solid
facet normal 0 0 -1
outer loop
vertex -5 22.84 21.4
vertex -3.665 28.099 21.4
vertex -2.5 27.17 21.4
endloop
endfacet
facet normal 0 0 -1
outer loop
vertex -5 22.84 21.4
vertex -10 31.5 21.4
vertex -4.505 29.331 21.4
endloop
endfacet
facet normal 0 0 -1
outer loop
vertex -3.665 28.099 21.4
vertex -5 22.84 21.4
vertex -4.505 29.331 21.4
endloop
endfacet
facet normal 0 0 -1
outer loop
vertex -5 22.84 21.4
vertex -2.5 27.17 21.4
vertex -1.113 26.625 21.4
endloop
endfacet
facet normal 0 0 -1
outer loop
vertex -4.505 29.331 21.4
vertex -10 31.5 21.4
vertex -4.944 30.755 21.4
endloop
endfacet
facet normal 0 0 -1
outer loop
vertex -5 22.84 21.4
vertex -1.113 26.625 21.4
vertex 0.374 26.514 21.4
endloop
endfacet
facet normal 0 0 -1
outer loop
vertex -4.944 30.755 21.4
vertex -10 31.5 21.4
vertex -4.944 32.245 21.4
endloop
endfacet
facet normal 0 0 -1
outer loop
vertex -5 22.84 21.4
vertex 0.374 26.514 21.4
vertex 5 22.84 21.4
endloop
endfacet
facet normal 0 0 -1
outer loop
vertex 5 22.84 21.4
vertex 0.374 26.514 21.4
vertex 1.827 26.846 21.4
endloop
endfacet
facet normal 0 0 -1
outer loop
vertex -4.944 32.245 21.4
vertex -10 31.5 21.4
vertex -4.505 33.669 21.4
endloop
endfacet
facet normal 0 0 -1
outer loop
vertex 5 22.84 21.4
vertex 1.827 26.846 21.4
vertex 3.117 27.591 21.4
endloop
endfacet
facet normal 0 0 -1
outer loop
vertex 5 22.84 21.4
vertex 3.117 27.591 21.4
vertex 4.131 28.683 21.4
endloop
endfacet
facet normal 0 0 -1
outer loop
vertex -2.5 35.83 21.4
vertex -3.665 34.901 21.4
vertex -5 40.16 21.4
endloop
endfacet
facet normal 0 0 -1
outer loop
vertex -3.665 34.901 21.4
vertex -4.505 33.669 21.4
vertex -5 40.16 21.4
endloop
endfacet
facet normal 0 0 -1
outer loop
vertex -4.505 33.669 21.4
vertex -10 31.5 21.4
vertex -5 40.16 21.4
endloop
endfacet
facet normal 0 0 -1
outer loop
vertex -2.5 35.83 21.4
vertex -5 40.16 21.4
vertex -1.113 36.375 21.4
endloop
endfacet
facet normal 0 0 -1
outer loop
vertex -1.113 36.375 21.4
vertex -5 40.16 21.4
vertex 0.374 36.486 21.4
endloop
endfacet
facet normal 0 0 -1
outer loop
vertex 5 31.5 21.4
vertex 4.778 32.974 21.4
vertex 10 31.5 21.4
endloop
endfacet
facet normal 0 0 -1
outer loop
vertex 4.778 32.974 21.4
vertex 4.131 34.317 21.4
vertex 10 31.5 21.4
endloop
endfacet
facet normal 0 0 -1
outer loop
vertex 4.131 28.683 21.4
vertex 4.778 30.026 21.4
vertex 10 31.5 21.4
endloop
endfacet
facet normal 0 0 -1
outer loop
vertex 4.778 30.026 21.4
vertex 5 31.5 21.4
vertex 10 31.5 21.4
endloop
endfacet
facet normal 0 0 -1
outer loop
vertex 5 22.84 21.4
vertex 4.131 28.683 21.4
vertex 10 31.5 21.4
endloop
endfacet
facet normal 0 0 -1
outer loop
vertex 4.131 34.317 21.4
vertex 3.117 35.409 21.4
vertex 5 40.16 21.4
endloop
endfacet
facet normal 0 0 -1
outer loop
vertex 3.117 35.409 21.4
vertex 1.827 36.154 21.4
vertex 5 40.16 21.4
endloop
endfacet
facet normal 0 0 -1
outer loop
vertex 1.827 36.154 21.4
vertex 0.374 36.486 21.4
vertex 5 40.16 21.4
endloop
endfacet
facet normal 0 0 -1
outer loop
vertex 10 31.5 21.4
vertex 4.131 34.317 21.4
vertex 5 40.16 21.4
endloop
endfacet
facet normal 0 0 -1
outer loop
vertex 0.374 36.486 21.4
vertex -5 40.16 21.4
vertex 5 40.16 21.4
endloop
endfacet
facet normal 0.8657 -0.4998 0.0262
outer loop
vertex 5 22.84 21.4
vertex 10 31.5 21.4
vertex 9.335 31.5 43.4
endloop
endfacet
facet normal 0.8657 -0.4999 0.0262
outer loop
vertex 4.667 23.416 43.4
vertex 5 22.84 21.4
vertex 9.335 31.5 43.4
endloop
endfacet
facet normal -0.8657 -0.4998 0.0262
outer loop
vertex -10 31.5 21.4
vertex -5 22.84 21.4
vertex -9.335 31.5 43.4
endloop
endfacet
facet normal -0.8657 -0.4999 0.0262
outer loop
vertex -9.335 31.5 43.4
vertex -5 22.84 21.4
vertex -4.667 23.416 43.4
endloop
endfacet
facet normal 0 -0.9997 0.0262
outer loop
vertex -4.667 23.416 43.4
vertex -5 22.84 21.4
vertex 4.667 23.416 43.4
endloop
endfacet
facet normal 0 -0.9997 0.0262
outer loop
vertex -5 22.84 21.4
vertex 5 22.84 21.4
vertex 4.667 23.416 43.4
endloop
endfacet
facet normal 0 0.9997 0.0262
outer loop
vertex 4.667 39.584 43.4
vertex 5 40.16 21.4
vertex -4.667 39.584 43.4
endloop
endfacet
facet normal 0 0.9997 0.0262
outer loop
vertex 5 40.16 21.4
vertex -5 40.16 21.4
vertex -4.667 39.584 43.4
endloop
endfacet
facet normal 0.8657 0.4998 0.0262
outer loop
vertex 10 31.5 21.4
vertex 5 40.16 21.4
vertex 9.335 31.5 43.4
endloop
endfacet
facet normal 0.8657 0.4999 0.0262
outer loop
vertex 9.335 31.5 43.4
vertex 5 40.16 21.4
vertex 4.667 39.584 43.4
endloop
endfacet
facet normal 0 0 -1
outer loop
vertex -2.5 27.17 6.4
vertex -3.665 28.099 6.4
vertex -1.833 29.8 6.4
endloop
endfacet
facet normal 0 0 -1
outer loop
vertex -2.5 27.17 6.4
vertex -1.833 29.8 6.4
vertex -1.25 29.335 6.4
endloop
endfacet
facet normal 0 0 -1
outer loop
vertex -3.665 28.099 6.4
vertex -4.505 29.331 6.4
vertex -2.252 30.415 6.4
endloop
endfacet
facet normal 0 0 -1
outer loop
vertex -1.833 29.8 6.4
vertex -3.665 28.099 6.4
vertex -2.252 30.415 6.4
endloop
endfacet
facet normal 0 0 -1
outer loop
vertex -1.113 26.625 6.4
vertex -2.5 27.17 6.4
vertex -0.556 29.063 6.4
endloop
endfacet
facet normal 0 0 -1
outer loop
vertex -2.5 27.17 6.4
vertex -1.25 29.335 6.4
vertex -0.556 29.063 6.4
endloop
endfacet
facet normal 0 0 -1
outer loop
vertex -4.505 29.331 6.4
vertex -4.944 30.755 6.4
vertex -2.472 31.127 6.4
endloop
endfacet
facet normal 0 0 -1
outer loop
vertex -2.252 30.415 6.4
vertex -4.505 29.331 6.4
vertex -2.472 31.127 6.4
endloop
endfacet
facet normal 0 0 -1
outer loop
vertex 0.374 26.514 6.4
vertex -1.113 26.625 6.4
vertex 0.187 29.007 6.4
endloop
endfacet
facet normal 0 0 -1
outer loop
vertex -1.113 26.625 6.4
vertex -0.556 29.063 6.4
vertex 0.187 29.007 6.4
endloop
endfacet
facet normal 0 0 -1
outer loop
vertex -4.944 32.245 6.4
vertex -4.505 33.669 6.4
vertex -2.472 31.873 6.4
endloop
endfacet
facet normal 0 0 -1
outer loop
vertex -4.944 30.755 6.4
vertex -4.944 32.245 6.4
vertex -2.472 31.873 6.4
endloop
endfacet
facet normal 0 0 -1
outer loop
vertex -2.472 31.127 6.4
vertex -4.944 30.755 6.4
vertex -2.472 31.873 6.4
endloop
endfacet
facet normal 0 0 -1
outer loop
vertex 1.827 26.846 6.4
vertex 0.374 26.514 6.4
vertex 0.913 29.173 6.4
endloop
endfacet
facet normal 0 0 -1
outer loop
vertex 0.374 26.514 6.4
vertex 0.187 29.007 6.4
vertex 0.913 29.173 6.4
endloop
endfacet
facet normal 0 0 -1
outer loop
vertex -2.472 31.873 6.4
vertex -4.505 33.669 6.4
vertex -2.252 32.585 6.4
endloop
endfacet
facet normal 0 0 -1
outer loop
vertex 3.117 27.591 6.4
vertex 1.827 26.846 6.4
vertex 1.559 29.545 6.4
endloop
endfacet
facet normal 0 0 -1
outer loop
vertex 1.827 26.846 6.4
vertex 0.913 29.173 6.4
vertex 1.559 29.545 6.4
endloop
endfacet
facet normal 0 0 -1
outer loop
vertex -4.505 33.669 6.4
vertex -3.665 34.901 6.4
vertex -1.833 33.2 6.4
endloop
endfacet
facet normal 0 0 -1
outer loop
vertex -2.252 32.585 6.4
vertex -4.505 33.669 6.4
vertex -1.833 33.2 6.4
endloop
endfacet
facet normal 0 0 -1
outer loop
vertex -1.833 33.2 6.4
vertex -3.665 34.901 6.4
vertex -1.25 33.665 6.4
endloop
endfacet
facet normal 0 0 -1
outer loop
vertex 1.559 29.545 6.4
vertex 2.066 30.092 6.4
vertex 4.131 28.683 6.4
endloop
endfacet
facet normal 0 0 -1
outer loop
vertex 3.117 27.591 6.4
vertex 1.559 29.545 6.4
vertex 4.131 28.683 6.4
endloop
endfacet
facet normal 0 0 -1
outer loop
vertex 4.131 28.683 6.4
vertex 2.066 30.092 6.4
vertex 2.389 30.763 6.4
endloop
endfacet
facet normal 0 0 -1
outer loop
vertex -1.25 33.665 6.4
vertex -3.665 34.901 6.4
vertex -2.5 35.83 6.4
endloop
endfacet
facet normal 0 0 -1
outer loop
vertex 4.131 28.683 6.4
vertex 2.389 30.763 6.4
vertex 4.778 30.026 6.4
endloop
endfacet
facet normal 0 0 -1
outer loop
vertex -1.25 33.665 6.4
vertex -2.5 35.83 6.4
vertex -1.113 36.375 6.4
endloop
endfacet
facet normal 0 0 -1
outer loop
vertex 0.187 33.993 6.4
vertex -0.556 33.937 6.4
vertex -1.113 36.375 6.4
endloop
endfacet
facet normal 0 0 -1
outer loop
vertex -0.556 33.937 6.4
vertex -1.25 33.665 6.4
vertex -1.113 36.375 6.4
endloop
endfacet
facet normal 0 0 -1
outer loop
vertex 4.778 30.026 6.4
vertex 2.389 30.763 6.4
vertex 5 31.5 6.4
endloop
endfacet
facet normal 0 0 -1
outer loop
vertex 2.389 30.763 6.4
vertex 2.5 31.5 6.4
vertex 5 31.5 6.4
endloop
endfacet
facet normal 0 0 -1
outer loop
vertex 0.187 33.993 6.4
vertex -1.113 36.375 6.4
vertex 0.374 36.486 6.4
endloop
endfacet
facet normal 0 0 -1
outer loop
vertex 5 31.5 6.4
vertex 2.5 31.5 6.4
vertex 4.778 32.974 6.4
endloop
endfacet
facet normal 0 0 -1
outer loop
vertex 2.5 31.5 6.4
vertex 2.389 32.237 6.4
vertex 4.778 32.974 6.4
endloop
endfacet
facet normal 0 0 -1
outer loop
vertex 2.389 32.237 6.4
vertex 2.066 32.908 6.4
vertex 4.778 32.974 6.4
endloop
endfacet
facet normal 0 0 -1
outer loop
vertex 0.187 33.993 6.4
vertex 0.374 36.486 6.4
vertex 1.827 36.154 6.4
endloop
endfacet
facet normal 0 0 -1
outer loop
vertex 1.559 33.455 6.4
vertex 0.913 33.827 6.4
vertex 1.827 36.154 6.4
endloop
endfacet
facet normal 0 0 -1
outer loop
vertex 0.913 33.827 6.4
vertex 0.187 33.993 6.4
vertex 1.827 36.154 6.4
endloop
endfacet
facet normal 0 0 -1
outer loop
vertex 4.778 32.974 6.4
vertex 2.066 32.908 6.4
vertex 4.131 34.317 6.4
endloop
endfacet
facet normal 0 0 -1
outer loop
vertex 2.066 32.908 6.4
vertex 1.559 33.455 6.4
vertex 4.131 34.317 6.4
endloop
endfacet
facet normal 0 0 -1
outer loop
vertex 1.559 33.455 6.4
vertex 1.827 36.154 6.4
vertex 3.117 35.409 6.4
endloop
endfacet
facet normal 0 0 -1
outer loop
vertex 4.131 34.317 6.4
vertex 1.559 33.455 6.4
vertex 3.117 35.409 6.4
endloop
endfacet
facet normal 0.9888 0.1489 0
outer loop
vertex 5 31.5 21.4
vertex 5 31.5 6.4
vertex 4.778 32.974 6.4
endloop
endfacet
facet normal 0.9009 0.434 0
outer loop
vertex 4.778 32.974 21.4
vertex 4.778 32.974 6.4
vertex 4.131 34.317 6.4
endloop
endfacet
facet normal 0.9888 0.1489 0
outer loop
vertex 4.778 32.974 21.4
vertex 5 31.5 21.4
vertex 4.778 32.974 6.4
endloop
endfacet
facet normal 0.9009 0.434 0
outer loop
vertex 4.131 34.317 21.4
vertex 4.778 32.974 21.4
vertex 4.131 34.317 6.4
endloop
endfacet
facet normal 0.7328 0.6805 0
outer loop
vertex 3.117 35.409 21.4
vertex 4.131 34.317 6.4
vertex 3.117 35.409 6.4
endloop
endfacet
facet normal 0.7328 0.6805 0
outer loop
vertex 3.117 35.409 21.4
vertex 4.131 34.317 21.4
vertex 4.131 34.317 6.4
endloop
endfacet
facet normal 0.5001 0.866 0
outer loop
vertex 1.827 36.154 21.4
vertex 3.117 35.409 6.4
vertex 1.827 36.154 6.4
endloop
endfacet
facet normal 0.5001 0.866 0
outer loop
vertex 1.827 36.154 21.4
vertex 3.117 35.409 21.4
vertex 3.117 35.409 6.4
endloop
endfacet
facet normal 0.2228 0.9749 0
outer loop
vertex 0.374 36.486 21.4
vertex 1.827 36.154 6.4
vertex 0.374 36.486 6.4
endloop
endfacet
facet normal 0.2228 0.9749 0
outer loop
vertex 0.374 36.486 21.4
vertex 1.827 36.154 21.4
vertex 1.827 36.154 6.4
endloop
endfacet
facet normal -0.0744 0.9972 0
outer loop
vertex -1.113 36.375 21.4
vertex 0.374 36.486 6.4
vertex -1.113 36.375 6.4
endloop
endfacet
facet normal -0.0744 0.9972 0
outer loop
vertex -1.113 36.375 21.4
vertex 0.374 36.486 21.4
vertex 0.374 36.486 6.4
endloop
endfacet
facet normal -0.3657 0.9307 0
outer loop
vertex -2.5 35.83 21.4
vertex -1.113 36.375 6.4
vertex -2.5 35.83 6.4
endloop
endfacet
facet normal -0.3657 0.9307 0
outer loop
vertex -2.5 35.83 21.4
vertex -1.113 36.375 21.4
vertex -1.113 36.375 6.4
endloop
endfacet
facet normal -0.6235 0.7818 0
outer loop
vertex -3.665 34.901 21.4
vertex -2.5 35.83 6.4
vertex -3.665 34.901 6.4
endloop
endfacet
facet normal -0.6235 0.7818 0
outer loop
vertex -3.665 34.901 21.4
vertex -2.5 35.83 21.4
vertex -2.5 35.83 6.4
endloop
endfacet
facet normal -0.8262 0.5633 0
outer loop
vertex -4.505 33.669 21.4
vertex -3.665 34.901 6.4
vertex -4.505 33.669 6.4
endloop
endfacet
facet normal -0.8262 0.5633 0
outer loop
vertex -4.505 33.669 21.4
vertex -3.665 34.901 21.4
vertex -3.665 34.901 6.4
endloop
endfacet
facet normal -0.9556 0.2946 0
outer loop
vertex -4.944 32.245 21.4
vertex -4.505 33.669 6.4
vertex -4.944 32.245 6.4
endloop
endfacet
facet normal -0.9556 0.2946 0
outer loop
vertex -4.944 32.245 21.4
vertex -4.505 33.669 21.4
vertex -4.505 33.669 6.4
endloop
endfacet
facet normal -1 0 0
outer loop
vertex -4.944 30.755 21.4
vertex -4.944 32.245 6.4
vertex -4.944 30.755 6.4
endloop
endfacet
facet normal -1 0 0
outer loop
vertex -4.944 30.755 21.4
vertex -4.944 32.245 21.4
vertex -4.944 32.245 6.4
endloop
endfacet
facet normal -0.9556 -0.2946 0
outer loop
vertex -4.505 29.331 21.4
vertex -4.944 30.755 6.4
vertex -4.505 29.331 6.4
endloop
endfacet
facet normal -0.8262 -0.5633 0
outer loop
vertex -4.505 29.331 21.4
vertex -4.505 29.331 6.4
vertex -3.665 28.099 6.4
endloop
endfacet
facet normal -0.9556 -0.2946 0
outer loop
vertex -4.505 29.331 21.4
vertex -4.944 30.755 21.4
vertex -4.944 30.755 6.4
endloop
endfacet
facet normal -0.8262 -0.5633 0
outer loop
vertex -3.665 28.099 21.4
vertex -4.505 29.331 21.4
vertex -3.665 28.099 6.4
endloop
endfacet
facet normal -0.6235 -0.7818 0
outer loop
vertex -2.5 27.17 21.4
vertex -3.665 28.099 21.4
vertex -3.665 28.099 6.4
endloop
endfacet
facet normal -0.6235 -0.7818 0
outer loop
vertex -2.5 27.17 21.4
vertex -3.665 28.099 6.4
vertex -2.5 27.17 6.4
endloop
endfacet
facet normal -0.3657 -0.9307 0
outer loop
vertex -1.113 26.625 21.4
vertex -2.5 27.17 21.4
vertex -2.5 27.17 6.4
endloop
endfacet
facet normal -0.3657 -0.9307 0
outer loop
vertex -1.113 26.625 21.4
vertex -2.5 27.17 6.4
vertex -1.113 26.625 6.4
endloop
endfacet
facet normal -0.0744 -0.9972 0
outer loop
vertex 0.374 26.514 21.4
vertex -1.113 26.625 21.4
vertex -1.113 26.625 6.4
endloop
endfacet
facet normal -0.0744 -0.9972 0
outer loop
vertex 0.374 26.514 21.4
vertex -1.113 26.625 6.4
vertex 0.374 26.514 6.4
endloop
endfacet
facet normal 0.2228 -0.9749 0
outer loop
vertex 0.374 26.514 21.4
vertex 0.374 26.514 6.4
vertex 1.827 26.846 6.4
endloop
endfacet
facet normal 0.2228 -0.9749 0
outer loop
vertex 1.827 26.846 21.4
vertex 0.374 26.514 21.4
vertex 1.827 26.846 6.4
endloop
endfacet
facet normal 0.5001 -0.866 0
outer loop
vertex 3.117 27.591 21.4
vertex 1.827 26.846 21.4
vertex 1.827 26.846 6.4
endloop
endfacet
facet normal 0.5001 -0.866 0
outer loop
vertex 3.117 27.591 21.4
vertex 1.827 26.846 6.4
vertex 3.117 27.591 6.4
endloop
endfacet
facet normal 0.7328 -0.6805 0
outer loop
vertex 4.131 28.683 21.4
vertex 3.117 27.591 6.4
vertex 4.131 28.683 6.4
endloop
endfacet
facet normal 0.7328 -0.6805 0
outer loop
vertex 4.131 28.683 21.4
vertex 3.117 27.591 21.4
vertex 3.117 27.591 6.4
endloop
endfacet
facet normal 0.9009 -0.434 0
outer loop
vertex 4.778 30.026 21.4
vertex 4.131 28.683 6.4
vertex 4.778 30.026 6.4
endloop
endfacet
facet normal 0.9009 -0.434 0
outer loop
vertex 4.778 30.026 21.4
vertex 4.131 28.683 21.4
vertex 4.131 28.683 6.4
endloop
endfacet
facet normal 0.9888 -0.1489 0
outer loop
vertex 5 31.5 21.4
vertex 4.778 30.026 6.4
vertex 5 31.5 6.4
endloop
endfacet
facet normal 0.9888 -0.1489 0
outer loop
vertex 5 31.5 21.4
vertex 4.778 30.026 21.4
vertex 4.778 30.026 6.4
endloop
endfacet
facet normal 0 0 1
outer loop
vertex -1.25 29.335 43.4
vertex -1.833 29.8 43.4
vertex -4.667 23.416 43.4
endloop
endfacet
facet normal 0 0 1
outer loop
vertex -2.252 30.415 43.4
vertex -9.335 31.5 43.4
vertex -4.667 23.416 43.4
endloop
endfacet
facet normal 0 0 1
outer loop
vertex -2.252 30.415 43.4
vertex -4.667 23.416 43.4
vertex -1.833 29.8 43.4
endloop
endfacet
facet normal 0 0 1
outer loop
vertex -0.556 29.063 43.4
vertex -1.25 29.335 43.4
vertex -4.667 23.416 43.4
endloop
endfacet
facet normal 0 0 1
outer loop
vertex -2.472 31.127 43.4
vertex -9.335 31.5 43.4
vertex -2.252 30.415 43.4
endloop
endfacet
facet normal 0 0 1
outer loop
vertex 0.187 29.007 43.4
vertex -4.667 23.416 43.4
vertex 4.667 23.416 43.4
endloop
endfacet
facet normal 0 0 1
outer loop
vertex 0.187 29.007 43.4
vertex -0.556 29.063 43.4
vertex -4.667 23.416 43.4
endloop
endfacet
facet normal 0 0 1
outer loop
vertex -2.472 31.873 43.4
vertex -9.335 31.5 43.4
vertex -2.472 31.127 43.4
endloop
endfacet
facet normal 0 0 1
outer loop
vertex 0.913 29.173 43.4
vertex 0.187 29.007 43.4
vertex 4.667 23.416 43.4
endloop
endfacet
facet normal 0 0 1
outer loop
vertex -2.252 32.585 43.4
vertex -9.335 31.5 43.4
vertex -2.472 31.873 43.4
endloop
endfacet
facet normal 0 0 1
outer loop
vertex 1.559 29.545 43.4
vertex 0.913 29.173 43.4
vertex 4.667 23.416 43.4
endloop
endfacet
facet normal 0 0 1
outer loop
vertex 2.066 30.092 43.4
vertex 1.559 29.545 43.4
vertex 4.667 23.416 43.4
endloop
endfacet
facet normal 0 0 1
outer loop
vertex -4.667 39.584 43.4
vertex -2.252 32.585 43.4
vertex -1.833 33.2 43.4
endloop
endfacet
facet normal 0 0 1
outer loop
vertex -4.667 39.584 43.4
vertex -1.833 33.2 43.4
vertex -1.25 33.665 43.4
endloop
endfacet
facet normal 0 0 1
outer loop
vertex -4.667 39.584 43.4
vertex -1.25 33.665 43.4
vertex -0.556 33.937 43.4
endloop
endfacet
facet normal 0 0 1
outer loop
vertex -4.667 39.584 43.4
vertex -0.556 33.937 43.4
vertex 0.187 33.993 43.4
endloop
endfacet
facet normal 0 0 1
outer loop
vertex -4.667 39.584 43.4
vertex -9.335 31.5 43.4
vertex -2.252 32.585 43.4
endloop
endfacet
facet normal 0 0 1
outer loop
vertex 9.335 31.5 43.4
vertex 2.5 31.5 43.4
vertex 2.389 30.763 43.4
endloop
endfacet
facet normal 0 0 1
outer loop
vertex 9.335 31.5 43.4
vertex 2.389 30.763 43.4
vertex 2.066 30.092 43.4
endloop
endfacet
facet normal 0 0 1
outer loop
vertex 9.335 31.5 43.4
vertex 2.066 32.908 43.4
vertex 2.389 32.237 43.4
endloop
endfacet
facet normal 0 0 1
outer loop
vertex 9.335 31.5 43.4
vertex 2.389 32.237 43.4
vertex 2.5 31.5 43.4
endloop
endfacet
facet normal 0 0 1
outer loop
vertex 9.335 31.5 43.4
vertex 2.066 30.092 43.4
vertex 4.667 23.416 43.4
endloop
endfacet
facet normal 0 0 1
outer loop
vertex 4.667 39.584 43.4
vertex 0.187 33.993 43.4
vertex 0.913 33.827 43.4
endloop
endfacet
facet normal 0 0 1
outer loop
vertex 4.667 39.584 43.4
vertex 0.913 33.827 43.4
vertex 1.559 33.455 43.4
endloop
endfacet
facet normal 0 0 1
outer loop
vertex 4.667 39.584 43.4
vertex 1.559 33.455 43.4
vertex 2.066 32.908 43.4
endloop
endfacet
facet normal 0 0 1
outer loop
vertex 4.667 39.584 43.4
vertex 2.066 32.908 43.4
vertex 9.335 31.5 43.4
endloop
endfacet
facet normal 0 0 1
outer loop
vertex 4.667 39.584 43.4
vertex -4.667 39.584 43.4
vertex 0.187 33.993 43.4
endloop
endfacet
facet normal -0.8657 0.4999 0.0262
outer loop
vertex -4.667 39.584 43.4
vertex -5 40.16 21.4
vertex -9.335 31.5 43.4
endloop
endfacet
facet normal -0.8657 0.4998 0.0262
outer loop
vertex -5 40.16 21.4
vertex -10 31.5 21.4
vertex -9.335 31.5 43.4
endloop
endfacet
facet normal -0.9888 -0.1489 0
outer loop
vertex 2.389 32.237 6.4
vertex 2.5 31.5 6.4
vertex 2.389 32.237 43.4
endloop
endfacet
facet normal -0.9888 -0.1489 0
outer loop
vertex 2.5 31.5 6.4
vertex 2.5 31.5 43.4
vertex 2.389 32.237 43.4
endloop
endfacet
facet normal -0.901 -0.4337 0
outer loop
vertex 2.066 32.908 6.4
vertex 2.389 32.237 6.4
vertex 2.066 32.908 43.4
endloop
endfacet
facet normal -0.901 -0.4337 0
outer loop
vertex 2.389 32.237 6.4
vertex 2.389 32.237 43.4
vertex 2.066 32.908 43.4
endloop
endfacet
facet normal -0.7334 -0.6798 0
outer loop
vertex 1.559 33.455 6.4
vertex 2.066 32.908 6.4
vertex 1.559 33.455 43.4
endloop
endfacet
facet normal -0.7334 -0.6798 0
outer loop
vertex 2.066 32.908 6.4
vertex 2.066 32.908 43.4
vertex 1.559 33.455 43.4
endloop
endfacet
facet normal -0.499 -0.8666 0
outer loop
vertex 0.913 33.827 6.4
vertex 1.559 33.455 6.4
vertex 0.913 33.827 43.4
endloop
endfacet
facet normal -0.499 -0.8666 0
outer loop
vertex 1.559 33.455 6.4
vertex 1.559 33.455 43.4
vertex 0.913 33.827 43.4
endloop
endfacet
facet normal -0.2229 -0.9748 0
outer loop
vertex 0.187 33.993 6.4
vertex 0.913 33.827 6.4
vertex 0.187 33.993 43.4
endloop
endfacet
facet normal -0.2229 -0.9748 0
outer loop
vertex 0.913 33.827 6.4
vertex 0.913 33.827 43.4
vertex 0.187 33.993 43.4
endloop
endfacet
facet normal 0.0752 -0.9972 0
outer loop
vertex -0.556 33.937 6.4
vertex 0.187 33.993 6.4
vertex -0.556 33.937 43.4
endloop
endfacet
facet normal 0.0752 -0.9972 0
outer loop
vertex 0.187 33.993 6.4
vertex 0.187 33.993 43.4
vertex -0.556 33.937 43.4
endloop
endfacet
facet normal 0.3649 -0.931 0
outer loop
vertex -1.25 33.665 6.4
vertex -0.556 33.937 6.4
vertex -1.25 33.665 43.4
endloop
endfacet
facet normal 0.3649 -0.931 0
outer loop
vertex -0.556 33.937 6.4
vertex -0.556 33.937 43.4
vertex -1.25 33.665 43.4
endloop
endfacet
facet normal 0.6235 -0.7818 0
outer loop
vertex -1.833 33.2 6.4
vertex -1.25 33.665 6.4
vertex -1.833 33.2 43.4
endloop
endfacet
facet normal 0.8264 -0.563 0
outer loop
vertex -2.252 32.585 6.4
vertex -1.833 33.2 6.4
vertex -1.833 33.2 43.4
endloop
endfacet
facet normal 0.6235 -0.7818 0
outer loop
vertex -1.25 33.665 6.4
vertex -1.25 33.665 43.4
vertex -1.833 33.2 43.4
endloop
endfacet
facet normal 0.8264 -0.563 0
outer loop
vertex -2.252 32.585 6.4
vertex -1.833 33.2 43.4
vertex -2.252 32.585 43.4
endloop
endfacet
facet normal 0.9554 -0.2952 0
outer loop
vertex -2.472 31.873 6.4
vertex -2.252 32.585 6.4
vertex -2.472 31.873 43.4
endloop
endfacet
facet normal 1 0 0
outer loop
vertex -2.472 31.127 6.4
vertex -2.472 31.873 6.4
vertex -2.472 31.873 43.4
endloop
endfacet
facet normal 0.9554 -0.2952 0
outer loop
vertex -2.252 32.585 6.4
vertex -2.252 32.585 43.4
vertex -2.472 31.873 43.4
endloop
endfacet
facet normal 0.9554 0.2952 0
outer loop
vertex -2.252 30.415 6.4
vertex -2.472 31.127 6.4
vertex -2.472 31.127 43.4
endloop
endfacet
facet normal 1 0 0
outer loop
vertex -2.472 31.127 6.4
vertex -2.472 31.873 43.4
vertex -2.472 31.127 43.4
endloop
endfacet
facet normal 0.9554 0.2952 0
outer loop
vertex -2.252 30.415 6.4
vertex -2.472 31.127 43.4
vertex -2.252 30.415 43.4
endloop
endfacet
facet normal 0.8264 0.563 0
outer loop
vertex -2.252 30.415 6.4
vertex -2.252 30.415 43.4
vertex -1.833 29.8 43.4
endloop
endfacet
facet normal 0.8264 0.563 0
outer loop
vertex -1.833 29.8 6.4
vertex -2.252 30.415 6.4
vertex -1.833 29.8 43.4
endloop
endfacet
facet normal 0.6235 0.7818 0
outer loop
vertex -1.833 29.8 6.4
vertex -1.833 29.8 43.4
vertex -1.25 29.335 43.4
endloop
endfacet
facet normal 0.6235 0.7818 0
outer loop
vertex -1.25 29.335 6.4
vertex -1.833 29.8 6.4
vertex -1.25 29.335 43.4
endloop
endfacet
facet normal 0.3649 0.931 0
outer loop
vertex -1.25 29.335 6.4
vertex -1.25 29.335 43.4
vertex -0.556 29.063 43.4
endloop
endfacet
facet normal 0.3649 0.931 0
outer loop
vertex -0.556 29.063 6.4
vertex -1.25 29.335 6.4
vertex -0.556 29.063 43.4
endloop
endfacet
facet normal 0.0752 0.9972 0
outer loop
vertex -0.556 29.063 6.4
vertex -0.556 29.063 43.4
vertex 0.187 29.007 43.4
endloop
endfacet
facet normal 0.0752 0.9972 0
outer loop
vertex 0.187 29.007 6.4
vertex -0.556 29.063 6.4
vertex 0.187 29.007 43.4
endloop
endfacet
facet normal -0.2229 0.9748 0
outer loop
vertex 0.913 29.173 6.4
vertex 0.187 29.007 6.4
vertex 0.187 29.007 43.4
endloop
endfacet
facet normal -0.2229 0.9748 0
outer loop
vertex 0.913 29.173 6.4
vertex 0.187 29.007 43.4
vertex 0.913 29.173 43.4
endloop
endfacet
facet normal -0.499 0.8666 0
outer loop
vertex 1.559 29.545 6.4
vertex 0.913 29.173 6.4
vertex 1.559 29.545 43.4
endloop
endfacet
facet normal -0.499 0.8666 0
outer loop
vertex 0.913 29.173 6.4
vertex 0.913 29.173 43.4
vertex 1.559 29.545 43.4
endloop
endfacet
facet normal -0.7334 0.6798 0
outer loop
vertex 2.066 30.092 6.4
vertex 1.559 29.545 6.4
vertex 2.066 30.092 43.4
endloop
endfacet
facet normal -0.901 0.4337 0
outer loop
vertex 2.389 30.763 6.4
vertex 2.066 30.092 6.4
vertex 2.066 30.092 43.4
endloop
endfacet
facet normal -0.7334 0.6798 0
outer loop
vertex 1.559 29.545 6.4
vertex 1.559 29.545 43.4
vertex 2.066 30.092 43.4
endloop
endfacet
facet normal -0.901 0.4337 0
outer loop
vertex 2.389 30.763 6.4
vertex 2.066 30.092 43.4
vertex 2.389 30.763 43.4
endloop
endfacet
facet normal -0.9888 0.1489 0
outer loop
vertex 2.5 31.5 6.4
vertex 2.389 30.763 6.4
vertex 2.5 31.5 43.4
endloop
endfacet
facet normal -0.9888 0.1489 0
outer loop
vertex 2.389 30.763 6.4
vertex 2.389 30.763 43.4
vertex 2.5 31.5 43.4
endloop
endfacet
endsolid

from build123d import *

# Parameters (mm, degrees)
PAD008_DEPTH  = 22
PAD008_TAPER  = 1.5
SKETCH016_R   = 2.5
HOLE004_DEPTH = 69.506788
SKETCH017_R   = 5
PAD009_DEPTH  = 15
HOLE005_DEPTH = 25


with BuildPart() as part:
    # Sketch015 → Pad008 (new body)
    with BuildSketch(Plane.XY):
        Polygon((10, 0), (5, 8.660254), (-5, 8.660254), (-10, 0), (-5, -8.660254), (5, -8.660254), align=None)
    extrude(amount=PAD008_DEPTH, taper=PAD008_TAPER)

    # Sketch016 → Hole004 (cut)
    with BuildSketch(Plane.XY):
        Circle(SKETCH016_R)
    extrude(amount=HOLE004_DEPTH, mode=Mode.SUBTRACT)

    # Sketch017 → Pad009 (join)
    with BuildSketch(Plane.XY):
        Circle(SKETCH017_R)
    extrude(amount=-PAD009_DEPTH)

    # Sketch016 → Hole005 (cut)
    with BuildSketch(Plane.XY):
        Circle(SKETCH016_R)
    extrude(amount=-HOLE005_DEPTH, mode=Mode.SUBTRACT)


with BuildPart() as part_1:
    # Body007 placement: moved
    add(part.part.moved(Location((0, 31.5, 21.4))))


solid = part_1.part
